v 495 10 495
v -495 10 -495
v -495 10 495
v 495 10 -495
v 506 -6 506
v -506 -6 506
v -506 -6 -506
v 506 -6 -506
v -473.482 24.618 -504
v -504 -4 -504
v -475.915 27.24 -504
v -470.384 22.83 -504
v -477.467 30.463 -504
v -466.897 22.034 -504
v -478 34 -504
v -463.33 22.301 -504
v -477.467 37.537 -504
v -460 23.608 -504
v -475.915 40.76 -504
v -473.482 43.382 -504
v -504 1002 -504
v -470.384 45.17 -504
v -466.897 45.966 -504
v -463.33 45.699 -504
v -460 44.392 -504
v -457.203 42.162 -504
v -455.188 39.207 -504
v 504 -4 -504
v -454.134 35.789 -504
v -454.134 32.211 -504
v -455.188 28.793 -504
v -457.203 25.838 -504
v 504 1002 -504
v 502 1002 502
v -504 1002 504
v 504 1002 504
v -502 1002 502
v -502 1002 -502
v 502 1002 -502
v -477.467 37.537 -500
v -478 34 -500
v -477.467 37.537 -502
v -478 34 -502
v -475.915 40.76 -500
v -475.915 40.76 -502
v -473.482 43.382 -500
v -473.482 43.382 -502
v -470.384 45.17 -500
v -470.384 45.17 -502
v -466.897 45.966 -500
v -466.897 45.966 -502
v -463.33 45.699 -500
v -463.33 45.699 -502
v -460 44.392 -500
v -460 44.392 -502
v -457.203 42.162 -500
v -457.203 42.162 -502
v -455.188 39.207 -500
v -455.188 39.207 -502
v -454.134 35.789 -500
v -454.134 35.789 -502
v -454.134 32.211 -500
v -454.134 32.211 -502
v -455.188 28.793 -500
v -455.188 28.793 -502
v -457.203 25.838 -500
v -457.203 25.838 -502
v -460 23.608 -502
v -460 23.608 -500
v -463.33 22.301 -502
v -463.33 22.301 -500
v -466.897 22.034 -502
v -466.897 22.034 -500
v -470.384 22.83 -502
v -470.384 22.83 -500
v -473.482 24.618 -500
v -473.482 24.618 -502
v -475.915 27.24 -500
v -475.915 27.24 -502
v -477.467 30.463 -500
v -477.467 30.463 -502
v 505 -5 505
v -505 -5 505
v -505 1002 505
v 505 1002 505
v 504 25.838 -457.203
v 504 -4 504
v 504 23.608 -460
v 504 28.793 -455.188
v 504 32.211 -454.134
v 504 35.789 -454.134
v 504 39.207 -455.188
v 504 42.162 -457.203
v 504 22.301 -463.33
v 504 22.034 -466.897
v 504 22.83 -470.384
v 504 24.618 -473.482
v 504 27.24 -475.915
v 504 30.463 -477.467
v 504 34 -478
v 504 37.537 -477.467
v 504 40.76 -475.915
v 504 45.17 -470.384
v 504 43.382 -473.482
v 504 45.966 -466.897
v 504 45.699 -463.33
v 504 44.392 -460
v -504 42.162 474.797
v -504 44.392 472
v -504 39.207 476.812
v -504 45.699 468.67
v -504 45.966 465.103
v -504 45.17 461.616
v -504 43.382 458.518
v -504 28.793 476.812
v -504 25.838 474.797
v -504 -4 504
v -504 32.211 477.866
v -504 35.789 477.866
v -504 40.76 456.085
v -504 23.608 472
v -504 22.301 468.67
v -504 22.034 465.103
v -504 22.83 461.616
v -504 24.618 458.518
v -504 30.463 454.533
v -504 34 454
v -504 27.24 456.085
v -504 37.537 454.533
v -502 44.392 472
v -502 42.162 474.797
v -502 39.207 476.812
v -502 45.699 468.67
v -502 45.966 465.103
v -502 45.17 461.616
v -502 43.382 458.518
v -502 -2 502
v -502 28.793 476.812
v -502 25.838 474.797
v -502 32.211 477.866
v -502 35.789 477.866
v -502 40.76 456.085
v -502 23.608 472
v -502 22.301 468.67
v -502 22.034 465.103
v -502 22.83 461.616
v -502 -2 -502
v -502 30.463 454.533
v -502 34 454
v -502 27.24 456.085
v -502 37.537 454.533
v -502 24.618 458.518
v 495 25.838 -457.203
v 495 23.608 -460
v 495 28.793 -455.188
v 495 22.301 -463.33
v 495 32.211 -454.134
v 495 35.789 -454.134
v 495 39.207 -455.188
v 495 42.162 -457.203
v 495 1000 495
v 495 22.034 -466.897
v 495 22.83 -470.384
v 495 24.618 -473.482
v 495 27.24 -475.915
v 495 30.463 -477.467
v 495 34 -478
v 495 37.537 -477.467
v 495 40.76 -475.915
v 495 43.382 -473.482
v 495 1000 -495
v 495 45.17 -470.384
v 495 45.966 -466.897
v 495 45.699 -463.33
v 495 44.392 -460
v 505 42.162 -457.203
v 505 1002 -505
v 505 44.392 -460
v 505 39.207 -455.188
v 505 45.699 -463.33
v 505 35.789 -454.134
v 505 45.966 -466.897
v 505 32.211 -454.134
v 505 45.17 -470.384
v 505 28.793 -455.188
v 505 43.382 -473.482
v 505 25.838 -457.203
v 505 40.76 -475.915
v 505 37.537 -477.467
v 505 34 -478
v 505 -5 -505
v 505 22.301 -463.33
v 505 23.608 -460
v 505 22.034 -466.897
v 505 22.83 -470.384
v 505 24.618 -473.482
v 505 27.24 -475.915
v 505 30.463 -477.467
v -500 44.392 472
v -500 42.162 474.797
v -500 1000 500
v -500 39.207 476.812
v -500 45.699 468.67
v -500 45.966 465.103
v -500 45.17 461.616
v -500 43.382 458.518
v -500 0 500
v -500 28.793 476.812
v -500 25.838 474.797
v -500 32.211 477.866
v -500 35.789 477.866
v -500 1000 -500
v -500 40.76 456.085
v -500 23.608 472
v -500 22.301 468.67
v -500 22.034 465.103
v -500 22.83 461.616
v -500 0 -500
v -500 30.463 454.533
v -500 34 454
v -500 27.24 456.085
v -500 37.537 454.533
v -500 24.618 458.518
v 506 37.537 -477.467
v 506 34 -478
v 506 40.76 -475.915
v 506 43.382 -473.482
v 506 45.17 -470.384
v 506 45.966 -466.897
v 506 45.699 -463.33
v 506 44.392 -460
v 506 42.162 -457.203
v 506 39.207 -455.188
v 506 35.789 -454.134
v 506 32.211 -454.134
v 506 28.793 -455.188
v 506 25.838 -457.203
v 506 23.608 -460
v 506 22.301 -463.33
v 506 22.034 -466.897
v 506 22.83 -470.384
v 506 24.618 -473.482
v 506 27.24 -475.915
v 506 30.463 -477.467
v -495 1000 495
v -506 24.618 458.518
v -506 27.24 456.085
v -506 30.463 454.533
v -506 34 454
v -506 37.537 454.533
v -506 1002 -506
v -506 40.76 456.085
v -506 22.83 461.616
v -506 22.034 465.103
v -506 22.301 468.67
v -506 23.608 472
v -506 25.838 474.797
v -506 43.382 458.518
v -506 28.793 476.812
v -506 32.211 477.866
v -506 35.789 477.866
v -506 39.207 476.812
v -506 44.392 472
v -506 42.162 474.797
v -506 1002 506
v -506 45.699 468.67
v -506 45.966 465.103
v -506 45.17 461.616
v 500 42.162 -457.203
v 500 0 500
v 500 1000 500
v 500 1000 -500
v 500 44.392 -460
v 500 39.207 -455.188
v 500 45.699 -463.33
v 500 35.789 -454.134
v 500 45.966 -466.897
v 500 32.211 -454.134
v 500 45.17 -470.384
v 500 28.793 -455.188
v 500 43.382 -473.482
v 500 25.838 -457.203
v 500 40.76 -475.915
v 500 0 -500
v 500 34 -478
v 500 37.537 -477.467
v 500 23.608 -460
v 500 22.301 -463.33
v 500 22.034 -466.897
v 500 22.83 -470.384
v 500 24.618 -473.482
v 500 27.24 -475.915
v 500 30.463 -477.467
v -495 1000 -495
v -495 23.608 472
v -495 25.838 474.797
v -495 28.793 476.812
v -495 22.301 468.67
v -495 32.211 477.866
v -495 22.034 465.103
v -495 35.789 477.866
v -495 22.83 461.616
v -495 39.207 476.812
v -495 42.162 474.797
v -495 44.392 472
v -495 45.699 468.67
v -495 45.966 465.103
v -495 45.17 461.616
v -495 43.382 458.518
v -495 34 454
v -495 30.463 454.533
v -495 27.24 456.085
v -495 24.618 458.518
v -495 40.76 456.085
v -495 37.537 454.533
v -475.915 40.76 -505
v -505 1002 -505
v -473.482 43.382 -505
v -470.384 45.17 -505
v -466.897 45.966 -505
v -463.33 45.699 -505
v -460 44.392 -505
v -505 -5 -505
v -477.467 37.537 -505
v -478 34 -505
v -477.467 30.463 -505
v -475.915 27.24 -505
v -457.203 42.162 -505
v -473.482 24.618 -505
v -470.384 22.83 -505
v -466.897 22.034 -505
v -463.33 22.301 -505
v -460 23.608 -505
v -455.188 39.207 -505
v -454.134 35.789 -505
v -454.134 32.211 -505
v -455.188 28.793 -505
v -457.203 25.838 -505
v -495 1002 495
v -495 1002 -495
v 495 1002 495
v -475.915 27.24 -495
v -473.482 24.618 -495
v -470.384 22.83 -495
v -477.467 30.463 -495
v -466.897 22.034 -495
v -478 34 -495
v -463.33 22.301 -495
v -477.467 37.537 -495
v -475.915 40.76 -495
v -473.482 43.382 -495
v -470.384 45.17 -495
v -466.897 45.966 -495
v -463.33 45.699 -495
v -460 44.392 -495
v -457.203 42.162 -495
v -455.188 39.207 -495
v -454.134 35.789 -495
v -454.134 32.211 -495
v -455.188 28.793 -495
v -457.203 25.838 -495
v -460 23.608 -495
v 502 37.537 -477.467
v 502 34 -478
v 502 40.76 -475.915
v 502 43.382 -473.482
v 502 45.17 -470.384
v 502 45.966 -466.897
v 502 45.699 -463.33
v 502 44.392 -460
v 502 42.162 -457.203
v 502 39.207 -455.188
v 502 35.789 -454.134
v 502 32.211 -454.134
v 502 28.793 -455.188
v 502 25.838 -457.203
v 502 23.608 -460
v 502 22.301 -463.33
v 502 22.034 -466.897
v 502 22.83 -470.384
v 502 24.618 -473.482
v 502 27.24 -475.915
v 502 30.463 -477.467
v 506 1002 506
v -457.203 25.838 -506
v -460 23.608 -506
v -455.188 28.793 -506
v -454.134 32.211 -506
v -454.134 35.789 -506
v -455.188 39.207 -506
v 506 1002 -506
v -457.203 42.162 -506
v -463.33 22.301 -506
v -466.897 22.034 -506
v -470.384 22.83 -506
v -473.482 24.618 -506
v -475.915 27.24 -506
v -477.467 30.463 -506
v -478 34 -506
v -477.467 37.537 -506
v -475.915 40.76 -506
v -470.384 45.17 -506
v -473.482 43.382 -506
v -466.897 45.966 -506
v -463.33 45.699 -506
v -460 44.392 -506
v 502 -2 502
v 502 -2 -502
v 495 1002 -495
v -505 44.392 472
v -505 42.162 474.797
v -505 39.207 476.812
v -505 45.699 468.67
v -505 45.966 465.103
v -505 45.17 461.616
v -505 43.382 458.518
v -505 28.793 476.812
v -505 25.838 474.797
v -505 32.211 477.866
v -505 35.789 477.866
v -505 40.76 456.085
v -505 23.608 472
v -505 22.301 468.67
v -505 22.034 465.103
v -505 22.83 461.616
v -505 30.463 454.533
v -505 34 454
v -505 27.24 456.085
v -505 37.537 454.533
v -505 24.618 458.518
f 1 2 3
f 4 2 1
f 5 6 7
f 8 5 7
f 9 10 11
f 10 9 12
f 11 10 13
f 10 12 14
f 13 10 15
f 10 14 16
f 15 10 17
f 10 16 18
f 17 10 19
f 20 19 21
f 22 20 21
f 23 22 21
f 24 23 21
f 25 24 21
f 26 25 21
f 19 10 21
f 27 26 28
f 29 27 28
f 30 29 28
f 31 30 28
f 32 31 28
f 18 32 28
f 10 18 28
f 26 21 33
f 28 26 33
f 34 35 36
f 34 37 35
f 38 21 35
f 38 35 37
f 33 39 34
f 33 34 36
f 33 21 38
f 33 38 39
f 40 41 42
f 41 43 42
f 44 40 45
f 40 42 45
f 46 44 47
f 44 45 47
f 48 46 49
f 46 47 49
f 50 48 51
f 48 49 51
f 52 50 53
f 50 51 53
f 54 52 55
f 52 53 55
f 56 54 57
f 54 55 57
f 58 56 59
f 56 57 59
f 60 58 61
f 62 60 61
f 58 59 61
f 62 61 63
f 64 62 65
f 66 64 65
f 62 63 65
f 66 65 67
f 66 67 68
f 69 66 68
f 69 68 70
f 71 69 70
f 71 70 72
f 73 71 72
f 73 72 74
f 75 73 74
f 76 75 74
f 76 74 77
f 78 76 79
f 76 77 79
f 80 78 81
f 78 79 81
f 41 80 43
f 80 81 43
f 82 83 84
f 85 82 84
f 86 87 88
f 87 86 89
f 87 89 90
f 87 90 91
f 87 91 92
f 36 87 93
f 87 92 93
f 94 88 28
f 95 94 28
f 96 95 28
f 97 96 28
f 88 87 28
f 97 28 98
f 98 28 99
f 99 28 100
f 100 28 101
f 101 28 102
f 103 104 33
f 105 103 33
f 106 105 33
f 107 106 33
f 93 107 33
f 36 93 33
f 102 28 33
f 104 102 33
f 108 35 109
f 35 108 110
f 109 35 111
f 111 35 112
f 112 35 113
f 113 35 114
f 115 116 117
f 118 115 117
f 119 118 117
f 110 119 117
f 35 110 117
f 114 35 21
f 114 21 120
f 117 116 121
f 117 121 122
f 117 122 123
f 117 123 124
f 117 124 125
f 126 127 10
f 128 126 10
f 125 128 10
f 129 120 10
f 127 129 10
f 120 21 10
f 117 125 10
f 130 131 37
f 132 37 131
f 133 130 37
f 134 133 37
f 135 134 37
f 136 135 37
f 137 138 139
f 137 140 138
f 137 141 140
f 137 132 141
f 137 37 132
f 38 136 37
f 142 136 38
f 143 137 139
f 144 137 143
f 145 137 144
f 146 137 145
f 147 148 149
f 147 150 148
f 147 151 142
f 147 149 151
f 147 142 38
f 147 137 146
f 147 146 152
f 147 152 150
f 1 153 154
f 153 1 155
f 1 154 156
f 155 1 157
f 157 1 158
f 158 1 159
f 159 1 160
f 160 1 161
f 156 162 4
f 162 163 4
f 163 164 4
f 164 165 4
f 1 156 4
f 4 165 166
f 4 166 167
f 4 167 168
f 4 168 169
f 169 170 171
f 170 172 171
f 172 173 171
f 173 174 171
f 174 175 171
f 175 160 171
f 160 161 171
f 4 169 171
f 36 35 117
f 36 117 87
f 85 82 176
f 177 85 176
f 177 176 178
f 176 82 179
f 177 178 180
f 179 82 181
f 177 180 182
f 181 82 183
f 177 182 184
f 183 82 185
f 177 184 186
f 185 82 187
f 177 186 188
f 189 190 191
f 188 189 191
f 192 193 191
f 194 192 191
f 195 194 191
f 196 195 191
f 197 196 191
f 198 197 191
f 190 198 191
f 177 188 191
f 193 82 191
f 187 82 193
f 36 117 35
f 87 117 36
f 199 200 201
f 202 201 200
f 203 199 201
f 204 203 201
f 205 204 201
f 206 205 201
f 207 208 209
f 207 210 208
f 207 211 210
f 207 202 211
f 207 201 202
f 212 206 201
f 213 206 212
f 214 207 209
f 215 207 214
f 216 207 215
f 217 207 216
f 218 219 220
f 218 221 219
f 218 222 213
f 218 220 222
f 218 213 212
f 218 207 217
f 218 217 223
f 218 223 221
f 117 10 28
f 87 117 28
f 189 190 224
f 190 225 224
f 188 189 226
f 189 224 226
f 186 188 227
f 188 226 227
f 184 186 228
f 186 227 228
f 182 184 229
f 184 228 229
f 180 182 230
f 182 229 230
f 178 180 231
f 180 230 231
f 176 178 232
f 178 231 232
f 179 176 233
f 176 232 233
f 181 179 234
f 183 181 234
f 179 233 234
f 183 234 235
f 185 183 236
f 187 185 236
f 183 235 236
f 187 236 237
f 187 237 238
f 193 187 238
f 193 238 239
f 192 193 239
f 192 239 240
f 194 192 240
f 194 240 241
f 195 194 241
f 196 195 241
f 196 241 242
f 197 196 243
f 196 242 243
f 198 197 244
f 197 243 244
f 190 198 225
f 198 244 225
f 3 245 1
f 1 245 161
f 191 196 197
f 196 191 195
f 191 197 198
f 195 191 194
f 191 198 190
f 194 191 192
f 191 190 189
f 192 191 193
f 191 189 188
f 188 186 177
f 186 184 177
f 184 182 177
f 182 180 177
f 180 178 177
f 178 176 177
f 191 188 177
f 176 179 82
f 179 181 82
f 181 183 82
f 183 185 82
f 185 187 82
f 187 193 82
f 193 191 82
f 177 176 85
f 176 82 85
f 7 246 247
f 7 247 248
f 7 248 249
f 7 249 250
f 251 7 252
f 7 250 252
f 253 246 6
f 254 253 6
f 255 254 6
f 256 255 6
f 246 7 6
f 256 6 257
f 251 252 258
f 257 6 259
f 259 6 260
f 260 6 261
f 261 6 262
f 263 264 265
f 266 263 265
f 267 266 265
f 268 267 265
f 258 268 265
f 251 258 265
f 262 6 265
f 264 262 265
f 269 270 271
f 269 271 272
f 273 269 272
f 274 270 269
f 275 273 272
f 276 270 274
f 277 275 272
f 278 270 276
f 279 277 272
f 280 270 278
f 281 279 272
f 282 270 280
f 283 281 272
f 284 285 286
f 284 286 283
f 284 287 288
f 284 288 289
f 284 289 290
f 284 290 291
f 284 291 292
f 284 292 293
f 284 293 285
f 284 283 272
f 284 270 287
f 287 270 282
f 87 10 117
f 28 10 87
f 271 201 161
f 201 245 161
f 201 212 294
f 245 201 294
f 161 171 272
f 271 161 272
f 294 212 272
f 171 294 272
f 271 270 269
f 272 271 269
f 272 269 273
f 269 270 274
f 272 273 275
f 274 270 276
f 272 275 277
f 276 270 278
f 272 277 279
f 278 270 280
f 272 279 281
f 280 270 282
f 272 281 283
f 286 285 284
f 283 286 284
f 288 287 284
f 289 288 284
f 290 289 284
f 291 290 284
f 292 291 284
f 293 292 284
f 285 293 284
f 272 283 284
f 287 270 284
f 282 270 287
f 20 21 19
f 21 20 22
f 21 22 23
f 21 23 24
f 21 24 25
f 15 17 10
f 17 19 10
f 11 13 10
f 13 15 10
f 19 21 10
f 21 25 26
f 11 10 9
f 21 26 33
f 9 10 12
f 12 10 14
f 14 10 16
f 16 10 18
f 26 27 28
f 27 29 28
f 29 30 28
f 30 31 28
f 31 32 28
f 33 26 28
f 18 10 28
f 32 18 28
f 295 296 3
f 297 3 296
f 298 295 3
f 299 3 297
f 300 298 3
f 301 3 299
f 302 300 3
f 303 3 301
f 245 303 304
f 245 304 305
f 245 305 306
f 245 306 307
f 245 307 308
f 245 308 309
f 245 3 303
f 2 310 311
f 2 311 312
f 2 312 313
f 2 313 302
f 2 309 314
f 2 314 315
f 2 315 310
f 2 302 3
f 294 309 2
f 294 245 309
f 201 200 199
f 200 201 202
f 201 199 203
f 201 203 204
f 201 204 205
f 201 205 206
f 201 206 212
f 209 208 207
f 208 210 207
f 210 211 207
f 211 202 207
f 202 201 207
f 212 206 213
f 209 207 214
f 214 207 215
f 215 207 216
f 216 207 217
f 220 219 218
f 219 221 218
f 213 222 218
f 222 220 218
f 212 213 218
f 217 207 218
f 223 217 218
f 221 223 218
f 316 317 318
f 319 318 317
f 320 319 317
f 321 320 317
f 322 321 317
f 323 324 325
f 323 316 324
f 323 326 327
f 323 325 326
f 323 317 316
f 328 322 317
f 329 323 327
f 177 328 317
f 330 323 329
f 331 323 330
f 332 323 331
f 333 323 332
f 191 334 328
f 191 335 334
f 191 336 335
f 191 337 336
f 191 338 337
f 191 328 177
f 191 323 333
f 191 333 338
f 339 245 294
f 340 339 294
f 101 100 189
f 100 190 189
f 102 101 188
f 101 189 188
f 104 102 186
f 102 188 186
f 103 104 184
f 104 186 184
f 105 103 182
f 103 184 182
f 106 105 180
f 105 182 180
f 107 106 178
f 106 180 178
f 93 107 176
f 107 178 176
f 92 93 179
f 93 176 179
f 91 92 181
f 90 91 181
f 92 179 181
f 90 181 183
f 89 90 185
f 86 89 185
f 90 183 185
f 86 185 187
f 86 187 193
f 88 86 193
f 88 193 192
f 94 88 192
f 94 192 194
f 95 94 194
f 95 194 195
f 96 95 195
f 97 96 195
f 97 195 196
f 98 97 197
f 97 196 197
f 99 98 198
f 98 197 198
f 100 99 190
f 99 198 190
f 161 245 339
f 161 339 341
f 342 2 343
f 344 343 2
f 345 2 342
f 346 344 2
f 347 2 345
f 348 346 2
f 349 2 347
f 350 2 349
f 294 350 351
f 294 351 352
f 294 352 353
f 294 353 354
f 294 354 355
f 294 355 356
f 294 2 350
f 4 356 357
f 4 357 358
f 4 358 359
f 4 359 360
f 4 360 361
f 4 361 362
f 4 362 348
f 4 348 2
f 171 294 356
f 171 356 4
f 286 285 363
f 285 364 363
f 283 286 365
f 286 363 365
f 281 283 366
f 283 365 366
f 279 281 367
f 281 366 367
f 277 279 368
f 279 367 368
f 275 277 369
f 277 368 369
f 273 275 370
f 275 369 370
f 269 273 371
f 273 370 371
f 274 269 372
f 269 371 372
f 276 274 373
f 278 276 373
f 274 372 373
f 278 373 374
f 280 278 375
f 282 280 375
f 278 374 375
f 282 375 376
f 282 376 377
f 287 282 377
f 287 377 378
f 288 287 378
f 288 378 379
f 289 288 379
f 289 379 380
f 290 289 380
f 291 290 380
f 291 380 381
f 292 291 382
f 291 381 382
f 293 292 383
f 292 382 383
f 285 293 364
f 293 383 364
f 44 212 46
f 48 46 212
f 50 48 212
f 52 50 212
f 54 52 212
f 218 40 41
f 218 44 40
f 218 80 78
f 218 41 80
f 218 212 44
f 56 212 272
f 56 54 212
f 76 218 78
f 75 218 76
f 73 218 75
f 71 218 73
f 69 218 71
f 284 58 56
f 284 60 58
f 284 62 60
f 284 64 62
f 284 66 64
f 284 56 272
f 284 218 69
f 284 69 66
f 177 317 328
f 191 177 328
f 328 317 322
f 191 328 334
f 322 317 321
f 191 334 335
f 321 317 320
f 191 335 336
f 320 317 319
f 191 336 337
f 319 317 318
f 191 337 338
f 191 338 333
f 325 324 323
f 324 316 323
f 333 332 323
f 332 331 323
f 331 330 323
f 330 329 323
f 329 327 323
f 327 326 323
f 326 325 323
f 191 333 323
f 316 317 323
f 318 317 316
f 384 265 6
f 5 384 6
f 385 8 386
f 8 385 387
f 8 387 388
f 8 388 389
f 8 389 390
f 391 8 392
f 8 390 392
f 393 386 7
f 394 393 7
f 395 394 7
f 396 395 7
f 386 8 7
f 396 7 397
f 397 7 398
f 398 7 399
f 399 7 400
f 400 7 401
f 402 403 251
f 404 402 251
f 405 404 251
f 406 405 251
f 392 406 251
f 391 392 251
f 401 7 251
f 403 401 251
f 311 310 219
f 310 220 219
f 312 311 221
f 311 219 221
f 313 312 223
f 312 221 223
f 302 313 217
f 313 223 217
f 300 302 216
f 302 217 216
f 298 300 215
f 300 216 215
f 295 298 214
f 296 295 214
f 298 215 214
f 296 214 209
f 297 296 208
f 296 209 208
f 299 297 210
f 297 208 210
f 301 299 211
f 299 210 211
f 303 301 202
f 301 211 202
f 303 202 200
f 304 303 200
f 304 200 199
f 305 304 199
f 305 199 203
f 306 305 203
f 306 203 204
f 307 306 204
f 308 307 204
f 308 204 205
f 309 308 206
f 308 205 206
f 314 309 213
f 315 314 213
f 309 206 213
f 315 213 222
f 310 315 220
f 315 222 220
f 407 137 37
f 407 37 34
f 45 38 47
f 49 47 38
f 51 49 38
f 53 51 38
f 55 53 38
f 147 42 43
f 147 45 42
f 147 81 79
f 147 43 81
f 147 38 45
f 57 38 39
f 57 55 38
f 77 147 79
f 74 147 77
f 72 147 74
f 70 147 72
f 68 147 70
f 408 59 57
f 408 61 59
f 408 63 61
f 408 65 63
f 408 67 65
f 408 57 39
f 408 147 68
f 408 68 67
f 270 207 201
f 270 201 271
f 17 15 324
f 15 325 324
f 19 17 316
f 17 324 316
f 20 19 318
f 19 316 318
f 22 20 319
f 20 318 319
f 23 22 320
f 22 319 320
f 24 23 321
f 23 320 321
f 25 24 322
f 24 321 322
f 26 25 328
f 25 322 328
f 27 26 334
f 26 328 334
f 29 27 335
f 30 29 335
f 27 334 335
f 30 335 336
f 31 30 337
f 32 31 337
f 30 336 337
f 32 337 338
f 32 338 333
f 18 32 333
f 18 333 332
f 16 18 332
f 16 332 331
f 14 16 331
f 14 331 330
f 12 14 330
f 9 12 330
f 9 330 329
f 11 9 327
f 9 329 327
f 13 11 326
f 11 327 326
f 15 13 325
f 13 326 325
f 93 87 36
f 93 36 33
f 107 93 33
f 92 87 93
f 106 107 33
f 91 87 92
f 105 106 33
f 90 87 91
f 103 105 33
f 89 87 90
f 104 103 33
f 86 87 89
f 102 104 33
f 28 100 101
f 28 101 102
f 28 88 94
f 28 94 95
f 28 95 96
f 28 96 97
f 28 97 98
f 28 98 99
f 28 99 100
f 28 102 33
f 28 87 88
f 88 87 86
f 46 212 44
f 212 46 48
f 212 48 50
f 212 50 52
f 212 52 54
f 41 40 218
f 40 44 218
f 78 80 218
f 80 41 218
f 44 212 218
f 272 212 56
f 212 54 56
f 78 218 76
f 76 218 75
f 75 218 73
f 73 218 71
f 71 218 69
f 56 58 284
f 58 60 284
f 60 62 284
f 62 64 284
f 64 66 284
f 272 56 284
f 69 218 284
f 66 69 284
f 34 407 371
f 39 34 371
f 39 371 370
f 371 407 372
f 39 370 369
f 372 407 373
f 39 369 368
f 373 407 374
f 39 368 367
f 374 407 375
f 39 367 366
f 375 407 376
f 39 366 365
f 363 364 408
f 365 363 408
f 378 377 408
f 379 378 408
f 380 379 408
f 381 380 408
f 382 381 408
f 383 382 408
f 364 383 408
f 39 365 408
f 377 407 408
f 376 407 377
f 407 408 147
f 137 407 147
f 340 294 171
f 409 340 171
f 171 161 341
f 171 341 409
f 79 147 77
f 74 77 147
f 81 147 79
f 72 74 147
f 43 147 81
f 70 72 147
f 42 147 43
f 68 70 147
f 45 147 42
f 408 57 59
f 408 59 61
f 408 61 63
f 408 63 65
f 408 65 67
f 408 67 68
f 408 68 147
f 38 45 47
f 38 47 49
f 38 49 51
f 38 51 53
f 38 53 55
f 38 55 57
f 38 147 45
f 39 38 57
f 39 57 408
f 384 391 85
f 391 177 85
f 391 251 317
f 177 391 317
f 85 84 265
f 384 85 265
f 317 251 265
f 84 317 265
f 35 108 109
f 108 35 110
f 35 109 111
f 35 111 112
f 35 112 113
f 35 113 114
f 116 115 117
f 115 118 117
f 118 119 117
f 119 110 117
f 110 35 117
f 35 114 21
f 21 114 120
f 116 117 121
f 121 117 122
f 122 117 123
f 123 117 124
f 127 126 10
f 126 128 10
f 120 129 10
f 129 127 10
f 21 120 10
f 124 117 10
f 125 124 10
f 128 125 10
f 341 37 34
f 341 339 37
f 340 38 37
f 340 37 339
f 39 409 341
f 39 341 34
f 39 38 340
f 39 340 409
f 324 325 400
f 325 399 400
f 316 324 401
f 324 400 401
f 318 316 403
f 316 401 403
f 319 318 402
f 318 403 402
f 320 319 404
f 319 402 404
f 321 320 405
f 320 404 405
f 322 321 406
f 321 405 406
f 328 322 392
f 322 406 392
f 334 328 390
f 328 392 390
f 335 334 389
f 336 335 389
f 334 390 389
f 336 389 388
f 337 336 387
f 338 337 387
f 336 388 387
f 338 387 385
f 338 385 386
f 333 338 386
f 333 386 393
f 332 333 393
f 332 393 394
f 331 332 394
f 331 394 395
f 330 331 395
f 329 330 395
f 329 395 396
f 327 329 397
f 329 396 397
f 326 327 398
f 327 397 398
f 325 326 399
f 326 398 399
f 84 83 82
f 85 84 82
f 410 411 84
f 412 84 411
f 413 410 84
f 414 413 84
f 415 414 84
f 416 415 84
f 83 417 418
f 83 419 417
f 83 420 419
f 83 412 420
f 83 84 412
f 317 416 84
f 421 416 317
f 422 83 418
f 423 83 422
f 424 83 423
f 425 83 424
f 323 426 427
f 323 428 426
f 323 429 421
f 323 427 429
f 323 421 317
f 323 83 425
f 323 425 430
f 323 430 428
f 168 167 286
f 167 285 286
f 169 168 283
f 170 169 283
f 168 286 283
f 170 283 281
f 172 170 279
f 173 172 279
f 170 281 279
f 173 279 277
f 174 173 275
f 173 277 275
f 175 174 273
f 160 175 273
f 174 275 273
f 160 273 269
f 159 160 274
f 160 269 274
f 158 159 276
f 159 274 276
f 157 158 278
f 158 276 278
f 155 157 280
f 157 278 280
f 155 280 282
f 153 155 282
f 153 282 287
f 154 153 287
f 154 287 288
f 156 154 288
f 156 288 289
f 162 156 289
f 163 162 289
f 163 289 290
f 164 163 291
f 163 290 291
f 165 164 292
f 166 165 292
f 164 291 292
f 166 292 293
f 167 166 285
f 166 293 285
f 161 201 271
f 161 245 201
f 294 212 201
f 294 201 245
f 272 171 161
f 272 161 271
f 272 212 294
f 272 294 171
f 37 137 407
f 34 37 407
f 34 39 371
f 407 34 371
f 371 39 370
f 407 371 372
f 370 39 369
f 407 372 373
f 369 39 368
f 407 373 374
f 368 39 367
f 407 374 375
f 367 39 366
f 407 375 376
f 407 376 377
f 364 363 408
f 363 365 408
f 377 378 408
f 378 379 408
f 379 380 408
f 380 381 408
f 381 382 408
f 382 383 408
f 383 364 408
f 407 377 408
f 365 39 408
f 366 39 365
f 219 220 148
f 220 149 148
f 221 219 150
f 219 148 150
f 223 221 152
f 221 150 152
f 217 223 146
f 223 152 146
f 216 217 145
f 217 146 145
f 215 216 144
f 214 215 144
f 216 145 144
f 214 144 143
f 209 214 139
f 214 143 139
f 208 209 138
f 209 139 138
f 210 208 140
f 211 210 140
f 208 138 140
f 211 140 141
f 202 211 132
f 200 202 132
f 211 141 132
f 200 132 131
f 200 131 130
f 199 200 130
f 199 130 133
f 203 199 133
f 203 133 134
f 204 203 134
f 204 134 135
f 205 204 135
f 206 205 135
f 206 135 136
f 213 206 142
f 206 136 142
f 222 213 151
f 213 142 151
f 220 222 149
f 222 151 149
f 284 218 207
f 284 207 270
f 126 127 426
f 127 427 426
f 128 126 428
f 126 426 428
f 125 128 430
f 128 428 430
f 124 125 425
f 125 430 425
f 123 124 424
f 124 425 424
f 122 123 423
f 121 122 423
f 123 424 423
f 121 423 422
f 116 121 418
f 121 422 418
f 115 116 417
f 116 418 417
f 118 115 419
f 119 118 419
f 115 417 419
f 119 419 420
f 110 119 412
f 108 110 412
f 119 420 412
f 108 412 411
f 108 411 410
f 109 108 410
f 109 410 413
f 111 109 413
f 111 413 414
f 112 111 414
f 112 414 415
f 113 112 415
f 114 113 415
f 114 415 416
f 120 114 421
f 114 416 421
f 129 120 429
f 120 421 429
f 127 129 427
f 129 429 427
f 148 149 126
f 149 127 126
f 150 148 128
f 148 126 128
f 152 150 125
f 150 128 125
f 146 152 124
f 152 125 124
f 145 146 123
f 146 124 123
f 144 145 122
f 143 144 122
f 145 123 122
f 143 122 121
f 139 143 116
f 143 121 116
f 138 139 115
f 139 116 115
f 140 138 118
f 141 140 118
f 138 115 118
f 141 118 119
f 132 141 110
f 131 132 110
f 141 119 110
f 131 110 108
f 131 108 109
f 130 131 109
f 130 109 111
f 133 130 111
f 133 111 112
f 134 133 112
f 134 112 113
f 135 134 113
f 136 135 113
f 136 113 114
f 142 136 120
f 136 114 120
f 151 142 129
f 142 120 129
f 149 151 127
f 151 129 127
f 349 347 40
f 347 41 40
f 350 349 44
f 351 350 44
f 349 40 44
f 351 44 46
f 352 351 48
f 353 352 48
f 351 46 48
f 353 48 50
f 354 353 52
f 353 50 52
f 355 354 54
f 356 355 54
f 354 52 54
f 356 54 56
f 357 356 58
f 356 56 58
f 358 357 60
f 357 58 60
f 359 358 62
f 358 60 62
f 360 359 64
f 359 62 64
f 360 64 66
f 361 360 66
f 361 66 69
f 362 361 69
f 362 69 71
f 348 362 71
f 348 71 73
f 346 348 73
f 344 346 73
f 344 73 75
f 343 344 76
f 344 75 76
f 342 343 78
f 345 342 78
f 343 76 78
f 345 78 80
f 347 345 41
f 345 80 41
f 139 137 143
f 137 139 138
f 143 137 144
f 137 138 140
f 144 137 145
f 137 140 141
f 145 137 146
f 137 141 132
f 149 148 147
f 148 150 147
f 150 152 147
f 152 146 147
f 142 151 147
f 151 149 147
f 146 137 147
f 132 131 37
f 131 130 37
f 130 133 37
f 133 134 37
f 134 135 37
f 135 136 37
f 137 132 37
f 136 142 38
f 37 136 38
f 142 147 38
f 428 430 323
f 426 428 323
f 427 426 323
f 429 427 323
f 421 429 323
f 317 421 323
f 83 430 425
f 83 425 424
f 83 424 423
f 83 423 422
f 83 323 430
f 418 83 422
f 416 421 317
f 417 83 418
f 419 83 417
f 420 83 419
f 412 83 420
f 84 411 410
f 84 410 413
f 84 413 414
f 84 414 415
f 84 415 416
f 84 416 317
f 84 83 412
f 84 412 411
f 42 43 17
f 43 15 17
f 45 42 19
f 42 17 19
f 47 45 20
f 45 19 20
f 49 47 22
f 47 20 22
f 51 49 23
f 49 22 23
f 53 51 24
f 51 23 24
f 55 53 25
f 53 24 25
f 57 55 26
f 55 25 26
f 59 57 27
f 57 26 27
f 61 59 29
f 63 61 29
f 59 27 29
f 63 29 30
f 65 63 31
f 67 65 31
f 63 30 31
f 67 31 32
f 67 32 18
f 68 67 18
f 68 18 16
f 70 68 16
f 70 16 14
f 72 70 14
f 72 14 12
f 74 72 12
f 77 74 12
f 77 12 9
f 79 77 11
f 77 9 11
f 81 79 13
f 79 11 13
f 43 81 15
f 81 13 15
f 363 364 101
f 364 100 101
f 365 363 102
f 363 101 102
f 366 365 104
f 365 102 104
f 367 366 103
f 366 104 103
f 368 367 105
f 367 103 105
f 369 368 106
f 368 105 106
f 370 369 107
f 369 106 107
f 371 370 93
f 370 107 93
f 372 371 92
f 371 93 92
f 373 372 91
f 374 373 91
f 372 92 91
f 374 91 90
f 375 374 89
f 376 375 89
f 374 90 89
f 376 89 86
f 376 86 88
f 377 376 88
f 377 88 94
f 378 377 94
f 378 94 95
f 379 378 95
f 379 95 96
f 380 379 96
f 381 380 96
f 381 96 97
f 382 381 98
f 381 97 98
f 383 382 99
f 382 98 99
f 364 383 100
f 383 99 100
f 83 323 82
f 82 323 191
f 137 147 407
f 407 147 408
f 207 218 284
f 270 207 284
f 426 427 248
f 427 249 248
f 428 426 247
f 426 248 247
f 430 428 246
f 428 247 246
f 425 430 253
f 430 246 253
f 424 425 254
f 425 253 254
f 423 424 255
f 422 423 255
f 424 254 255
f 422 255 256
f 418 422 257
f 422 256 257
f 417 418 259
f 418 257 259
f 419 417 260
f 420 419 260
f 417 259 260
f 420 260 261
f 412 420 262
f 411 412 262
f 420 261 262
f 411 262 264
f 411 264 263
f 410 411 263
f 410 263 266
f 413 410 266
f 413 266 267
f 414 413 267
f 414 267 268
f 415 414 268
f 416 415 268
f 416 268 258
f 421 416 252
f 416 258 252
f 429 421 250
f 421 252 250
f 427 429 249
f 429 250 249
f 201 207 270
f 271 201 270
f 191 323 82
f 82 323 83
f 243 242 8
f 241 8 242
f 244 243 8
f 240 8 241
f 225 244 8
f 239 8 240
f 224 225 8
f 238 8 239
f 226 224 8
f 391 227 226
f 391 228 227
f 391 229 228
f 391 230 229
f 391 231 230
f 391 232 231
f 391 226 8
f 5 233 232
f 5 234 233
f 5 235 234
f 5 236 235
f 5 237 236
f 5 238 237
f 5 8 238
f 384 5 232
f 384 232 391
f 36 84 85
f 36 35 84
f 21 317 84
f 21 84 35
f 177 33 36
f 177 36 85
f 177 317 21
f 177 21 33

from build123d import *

# Parameters (mm, degrees)
SKETCH1_W              = 1000
SKETCH1_H              = 1000
BOSS_EXTRUDE1_DEPTH    = 1000
SKETCH2_W              = 990
SKETCH2_H              = 990
CUT_EXTRUDE1_DEPTH     = 990
PRIMER_START           = -2
PRIMER_1_OUTLINE_W     = 1004
PRIMER_1_OUTLINE_H     = 1004
PRIMER_1_OUTLINE_W_2   = 1000
PRIMER_1_OUTLINE_H_2   = 1000
PRIMER_1_DEPTH         = 1004
PRIMER_1_2_OUTLINE_W   = 1000
PRIMER_1_2_OUTLINE_H   = 1000
PRIMER_1_2_DEPTH       = 2
PRIMER_START_2         = 1000
PRIMER_1_3_OUTLINE_W   = 1000
PRIMER_1_3_OUTLINE_H   = 1000
PRIMER_1_3_OUTLINE_W_2 = 990
PRIMER_1_3_OUTLINE_H_2 = 990
PRIMER_1_3_DEPTH       = 2
PRIMER_START_3         = -504
PRIMER_2_DEPTH         = 1008
PRIMER_2_2_OUTLINE_W   = 1004
PRIMER_2_2_OUTLINE_H   = 1004
PRIMER_2_2_DEPTH       = 2
PRIMER_START_4         = 502
PRIMER_2_3_OUTLINE_W   = 1004
PRIMER_2_3_OUTLINE_H   = 1004
PRIMER_2_3_DEPTH       = 2
PAINT_START            = -5
PAINT_1_OUTLINE_W      = 1010
PAINT_1_OUTLINE_H      = 1010
PAINT_1_OUTLINE_W_2    = 1008
PAINT_1_OUTLINE_H_2    = 1008
PAINT_1_DEPTH          = 1007
PAINT_1_2_OUTLINE_W    = 1008
PAINT_1_2_OUTLINE_H    = 1008
PAINT_1_2_DEPTH        = 1
PAINT_START_2          = -506
PAINT_2_DEPTH          = 1012
PAINT_2_2_OUTLINE_W    = 1007
PAINT_2_2_OUTLINE_H    = 1010
PAINT_2_2_DEPTH        = 1
PAINT_START_3          = 505
PAINT_2_3_OUTLINE_W    = 1007
PAINT_2_3_OUTLINE_H    = 1010
PAINT_2_3_DEPTH        = 1
SKETCH3_R              = 12
CUT_EXTRUDE2_DEPTH     = 40
SKETCH4_R              = 12
CUT_EXTRUDE3_DEPTH     = 40
SKETCH5_R              = 12
CUT_EXTRUDE4_DEPTH     = 40


# Read off the part's stored shape, not the designer's step: Primer 1, Primer 2, Paint 1, Paint 2
with BuildPart() as part:
    # Sketch1 → Boss-Extrude1 (new body)
    with BuildSketch(Plane(origin=(0, 0, 0), x_dir=(1, 0, 0), z_dir=(0, 1, 0))):
        Rectangle(SKETCH1_W, SKETCH1_H)
    extrude(amount=BOSS_EXTRUDE1_DEPTH)

    # Sketch2 → Cut-Extrude1 (cut)
    with BuildSketch(Plane(origin=(0, 1000, 0), x_dir=(1, 0, 0), z_dir=(0, 1, 0))):
        Rectangle(SKETCH2_W, SKETCH2_H)
    extrude(amount=-CUT_EXTRUDE1_DEPTH, mode=Mode.SUBTRACT)


with BuildPart() as body_2:
    # Primer 1 outline → Primer 1 (new body)
    with BuildSketch(Plane(origin=(0, 0, 0), x_dir=(1, 0, 0), z_dir=(0, 1, 0)).offset(PRIMER_START)):
        Rectangle(PRIMER_1_OUTLINE_W, PRIMER_1_OUTLINE_H)
        Rectangle(PRIMER_1_OUTLINE_W_2, PRIMER_1_OUTLINE_H_2, mode=Mode.SUBTRACT)
    extrude(amount=PRIMER_1_DEPTH)

    # Primer 1 2 outline → Primer 1 2 (add)
    with BuildSketch(Plane(origin=(0, 0, 0), x_dir=(1, 0, 0), z_dir=(0, 1, 0)).offset(PRIMER_START)):
        Rectangle(PRIMER_1_2_OUTLINE_W, PRIMER_1_2_OUTLINE_H)
    extrude(amount=PRIMER_1_2_DEPTH)

    # Primer 1 3 outline → Primer 1 3 (add)
    with BuildSketch(Plane(origin=(0, 0, 0), x_dir=(1, 0, 0), z_dir=(0, 1, 0)).offset(PRIMER_START_2)):
        Rectangle(PRIMER_1_3_OUTLINE_W, PRIMER_1_3_OUTLINE_H)
        Rectangle(PRIMER_1_3_OUTLINE_W_2, PRIMER_1_3_OUTLINE_H_2, mode=Mode.SUBTRACT)
    extrude(amount=PRIMER_1_3_DEPTH)


with BuildPart() as body_3:
    # Primer 2 outline → Primer 2 (new body)
    with BuildSketch(Plane.XY.offset(PRIMER_START_3)):
        Polygon((-504, -4), (504, -4), (504, 1002), (502, 1002), (502, -2), (-502, -2), (-502, 1002), (-504, 1002), align=None)
    extrude(amount=PRIMER_2_DEPTH)

    # Primer 2 2 outline → Primer 2 2 (add)
    with BuildSketch(Plane.XY.offset(PRIMER_START_3)):
        with Locations((0, 500)):
            Rectangle(PRIMER_2_2_OUTLINE_W, PRIMER_2_2_OUTLINE_H)
    extrude(amount=PRIMER_2_2_DEPTH)

    # Primer 2 3 outline → Primer 2 3 (add)
    with BuildSketch(Plane.XY.offset(PRIMER_START_4)):
        with Locations((0, 500)):
            Rectangle(PRIMER_2_3_OUTLINE_W, PRIMER_2_3_OUTLINE_H)
    extrude(amount=PRIMER_2_3_DEPTH)


with BuildPart() as body_4:
    # Paint 1 outline → Paint 1 (new body)
    with BuildSketch(Plane(origin=(0, 0, 0), x_dir=(1, 0, 0), z_dir=(0, 1, 0)).offset(PAINT_START)):
        Rectangle(PAINT_1_OUTLINE_W, PAINT_1_OUTLINE_H)
        Rectangle(PAINT_1_OUTLINE_W_2, PAINT_1_OUTLINE_H_2, mode=Mode.SUBTRACT)
    extrude(amount=PAINT_1_DEPTH)

    # Paint 1 2 outline → Paint 1 2 (add)
    with BuildSketch(Plane(origin=(0, 0, 0), x_dir=(1, 0, 0), z_dir=(0, 1, 0)).offset(PAINT_START)):
        Rectangle(PAINT_1_2_OUTLINE_W, PAINT_1_2_OUTLINE_H)
    extrude(amount=PAINT_1_2_DEPTH)


with BuildPart() as body_5:
    # Paint 2 outline → Paint 2 (new body)
    with BuildSketch(Plane.YZ.offset(PAINT_START_2)):
        Polygon((1002, 506), (-6, 506), (-6, -506), (1002, -506), (1002, -505), (-5, -505), (-5, 505), (1002, 505), align=None)
    extrude(amount=PAINT_2_DEPTH)

    # Paint 2 2 outline → Paint 2 2 (add)
    with BuildSketch(Plane.YZ.offset(PAINT_START_2)):
        with Locations((498.5, 0)):
            Rectangle(PAINT_2_2_OUTLINE_W, PAINT_2_2_OUTLINE_H)
    extrude(amount=PAINT_2_2_DEPTH)

    # Paint 2 3 outline → Paint 2 3 (add)
    with BuildSketch(Plane.YZ.offset(PAINT_START_3)):
        with Locations((498.5, 0)):
            Rectangle(PAINT_2_3_OUTLINE_W, PAINT_2_3_OUTLINE_H)
    extrude(amount=PAINT_2_3_DEPTH)


with BuildPart() as cut_extrude2_tool:
    # Sketch3 → Cut-Extrude2 (new, symmetric)
    with BuildSketch(Plane(origin=(506, 0, 0), x_dir=(0, 0, -1), z_dir=(1, 0, 0))):
        with Locations((466, 34)):
            Circle(SKETCH3_R)
    extrude(amount=CUT_EXTRUDE2_DEPTH, both=True)


with BuildPart() as part_1:
    add(part.part)

    # Cut-Extrude2: cut by cut_extrude2_tool
    add(cut_extrude2_tool.part, mode=Mode.SUBTRACT)


with BuildPart() as body_2_1:
    add(body_2.part)

    # Cut-Extrude2: cut by cut_extrude2_tool
    add(cut_extrude2_tool.part, mode=Mode.SUBTRACT)


with BuildPart() as body_3_1:
    add(body_3.part)

    # Cut-Extrude2: cut by cut_extrude2_tool
    add(cut_extrude2_tool.part, mode=Mode.SUBTRACT)


with BuildPart() as body_4_1:
    add(body_4.part)

    # Cut-Extrude2: cut by cut_extrude2_tool
    add(cut_extrude2_tool.part, mode=Mode.SUBTRACT)


with BuildPart() as body_5_1:
    add(body_5.part)

    # Cut-Extrude2: cut by cut_extrude2_tool
    add(cut_extrude2_tool.part, mode=Mode.SUBTRACT)


with BuildPart() as cut_extrude3_tool:
    # Sketch4 → Cut-Extrude3 (new, symmetric)
    with BuildSketch(Plane(origin=(0, 0, -506), x_dir=(-1, 0, 0), z_dir=(0, 0, -1))):
        with Locations((466, 34)):
            Circle(SKETCH4_R)
    extrude(amount=CUT_EXTRUDE3_DEPTH, both=True)


with BuildPart() as part_2:
    add(part_1.part)

    # Cut-Extrude3: cut by cut_extrude3_tool
    add(cut_extrude3_tool.part, mode=Mode.SUBTRACT)


with BuildPart() as body_2_2:
    add(body_2_1.part)

    # Cut-Extrude3: cut by cut_extrude3_tool
    add(cut_extrude3_tool.part, mode=Mode.SUBTRACT)


with BuildPart() as body_3_2:
    add(body_3_1.part)

    # Cut-Extrude3: cut by cut_extrude3_tool
    add(cut_extrude3_tool.part, mode=Mode.SUBTRACT)


with BuildPart() as body_4_2:
    add(body_4_1.part)

    # Cut-Extrude3: cut by cut_extrude3_tool
    add(cut_extrude3_tool.part, mode=Mode.SUBTRACT)


with BuildPart() as body_5_2:
    add(body_5_1.part)

    # Cut-Extrude3: cut by cut_extrude3_tool
    add(cut_extrude3_tool.part, mode=Mode.SUBTRACT)


with BuildPart() as cut_extrude4_tool:
    # Sketch5 → Cut-Extrude4 (new, symmetric)
    with BuildSketch(Plane.ZY.offset(506)):
        with Locations(Location((466, 34, 0), (0, 0, 180))):
            Circle(SKETCH5_R)
    extrude(amount=CUT_EXTRUDE4_DEPTH, both=True)


with BuildPart() as part_3:
    add(part_2.part)

    # Cut-Extrude4: cut by cut_extrude4_tool
    add(cut_extrude4_tool.part, mode=Mode.SUBTRACT)


with BuildPart() as body_2_3:
    add(body_2_2.part)

    # Cut-Extrude4: cut by cut_extrude4_tool
    add(cut_extrude4_tool.part, mode=Mode.SUBTRACT)


with BuildPart() as body_3_3:
    add(body_3_2.part)

    # Cut-Extrude4: cut by cut_extrude4_tool
    add(cut_extrude4_tool.part, mode=Mode.SUBTRACT)


with BuildPart() as body_4_3:
    add(body_4_2.part)

    # Cut-Extrude4: cut by cut_extrude4_tool
    add(cut_extrude4_tool.part, mode=Mode.SUBTRACT)


with BuildPart() as body_5_3:
    add(body_5_2.part)

    # Cut-Extrude4: cut by cut_extrude4_tool
    add(cut_extrude4_tool.part, mode=Mode.SUBTRACT)


solid = Compound([part_3.part, body_2_3.part, body_3_3.part, body_4_3.part, body_5_3.part])
